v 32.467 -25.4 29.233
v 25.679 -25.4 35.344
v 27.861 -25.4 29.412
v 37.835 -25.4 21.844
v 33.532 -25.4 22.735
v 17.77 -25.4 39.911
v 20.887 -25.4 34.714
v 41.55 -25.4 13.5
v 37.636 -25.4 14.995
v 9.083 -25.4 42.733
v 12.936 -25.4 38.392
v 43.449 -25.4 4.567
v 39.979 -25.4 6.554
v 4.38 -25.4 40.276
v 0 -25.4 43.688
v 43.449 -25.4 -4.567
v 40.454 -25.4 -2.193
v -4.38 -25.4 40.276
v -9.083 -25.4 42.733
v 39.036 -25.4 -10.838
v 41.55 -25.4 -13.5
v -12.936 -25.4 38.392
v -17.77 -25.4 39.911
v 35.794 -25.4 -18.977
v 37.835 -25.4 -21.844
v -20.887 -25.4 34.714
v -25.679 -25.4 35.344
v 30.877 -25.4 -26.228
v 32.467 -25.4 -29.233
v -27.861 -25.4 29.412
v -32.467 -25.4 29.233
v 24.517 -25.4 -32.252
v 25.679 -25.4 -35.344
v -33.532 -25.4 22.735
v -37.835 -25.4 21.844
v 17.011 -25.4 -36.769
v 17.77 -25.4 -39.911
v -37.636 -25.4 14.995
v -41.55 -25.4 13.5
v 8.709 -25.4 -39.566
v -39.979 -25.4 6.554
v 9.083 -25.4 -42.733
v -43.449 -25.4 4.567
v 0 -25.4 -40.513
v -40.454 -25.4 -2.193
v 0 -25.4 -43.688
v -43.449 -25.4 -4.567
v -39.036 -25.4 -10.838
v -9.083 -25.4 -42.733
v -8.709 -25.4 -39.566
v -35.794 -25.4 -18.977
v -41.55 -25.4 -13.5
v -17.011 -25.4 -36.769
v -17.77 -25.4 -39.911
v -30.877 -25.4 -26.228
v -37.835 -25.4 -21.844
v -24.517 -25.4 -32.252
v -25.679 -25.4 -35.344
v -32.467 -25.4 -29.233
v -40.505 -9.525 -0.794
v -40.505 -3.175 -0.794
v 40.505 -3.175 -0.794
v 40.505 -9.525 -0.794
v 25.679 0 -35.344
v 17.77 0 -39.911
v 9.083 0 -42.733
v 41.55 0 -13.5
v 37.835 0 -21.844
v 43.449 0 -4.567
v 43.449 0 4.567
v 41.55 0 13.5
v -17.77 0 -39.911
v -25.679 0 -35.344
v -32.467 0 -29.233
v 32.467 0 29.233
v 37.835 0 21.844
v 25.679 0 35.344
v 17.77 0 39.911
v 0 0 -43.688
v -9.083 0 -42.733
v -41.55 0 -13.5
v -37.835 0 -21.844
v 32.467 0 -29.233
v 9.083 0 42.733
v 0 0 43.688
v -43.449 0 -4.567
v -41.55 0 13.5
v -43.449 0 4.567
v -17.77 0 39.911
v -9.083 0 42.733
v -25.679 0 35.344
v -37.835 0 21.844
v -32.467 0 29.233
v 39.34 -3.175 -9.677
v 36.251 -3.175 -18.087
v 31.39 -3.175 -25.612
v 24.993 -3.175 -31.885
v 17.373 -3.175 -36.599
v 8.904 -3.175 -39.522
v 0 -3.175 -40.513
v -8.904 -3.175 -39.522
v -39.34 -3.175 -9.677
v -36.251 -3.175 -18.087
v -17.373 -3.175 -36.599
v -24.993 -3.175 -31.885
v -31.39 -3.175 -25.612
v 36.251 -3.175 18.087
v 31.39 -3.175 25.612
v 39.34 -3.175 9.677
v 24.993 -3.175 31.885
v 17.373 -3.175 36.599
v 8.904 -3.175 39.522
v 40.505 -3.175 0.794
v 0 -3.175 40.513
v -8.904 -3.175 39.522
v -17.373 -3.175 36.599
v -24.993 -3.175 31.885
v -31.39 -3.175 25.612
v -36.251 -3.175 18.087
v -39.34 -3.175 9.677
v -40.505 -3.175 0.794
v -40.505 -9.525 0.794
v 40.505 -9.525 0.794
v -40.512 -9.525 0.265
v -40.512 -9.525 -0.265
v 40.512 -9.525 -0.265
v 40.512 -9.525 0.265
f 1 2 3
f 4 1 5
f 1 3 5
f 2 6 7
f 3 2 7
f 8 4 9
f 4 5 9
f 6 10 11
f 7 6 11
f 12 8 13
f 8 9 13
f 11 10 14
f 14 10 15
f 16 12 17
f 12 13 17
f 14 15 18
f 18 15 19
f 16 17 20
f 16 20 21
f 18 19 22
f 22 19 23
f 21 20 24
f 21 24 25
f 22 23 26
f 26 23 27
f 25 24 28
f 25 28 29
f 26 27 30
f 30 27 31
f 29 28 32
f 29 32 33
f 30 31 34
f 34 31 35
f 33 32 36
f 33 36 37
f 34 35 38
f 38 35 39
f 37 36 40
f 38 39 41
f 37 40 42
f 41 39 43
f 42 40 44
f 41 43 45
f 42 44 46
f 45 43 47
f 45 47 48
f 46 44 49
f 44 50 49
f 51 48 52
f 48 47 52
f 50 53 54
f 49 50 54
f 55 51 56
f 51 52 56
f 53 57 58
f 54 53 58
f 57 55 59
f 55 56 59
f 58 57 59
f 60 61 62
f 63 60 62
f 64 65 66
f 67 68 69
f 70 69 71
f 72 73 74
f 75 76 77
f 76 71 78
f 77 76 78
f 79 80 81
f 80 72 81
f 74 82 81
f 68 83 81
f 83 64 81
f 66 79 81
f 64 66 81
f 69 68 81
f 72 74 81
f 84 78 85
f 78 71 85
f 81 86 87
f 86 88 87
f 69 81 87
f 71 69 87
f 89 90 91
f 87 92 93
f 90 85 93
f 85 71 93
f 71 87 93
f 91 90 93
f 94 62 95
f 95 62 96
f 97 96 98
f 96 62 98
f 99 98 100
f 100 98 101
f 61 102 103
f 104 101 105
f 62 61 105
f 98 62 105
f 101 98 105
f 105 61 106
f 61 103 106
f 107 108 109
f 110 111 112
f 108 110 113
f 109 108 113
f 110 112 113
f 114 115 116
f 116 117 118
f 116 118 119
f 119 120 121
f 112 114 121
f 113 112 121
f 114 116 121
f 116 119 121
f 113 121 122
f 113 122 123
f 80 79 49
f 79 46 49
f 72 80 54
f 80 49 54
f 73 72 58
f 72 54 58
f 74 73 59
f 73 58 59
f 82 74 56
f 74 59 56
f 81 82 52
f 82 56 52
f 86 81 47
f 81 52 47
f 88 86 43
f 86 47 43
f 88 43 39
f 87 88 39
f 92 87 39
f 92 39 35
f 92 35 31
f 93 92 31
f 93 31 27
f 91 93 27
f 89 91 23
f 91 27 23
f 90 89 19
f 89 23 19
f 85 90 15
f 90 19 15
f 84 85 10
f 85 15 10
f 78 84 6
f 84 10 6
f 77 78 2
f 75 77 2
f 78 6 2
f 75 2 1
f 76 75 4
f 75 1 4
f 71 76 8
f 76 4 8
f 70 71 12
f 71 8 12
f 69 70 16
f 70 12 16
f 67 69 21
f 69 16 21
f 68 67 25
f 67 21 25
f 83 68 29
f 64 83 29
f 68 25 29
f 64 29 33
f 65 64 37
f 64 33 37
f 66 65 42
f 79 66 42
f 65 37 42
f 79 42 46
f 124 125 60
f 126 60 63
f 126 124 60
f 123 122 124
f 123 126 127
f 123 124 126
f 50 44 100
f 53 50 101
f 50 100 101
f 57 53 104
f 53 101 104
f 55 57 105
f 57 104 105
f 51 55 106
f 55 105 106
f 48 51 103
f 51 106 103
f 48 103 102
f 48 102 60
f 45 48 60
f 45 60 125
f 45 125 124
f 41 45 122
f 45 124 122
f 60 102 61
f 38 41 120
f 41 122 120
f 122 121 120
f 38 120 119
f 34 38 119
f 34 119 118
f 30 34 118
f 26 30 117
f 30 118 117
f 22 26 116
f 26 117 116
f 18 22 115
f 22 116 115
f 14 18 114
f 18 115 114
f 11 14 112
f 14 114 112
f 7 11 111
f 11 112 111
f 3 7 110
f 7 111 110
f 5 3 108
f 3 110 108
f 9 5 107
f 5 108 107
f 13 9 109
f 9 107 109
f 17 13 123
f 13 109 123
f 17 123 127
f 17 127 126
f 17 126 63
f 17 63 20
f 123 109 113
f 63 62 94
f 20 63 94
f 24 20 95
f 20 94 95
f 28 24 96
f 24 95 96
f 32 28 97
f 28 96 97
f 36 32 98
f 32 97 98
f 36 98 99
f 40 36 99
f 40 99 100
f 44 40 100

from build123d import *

# Parameters (mm, degrees)
SKETCH2_W           = 81.026
SKETCH2_H           = 1.5875
BOSS_EXTRUDE1_DEPTH = 6.35


with BuildPart() as part:
    # Sketch1 → Revolve1 (revolve)
    with BuildSketch(Plane.XY, mode=Mode.PRIVATE) as revolve1_sk:
        Polygon((0, 0), (43.688, 0), (43.688, -25.4), (40.513, -25.4), (40.513, -3.175), (0, -3.175), align=None)
    revolve(revolve1_sk.sketch.rotate(Axis((0, -3.175, 0), (0, 1, 0)), 90), axis=Axis((0, -3.175, 0), (0, 1, 0)))

    # Sketch2 → Boss-Extrude1 (add)
    with BuildSketch(Plane.XZ.offset(3.175)):
        Rectangle(SKETCH2_W, SKETCH2_H)
    extrude(amount=BOSS_EXTRUDE1_DEPTH)


solid = part.part
